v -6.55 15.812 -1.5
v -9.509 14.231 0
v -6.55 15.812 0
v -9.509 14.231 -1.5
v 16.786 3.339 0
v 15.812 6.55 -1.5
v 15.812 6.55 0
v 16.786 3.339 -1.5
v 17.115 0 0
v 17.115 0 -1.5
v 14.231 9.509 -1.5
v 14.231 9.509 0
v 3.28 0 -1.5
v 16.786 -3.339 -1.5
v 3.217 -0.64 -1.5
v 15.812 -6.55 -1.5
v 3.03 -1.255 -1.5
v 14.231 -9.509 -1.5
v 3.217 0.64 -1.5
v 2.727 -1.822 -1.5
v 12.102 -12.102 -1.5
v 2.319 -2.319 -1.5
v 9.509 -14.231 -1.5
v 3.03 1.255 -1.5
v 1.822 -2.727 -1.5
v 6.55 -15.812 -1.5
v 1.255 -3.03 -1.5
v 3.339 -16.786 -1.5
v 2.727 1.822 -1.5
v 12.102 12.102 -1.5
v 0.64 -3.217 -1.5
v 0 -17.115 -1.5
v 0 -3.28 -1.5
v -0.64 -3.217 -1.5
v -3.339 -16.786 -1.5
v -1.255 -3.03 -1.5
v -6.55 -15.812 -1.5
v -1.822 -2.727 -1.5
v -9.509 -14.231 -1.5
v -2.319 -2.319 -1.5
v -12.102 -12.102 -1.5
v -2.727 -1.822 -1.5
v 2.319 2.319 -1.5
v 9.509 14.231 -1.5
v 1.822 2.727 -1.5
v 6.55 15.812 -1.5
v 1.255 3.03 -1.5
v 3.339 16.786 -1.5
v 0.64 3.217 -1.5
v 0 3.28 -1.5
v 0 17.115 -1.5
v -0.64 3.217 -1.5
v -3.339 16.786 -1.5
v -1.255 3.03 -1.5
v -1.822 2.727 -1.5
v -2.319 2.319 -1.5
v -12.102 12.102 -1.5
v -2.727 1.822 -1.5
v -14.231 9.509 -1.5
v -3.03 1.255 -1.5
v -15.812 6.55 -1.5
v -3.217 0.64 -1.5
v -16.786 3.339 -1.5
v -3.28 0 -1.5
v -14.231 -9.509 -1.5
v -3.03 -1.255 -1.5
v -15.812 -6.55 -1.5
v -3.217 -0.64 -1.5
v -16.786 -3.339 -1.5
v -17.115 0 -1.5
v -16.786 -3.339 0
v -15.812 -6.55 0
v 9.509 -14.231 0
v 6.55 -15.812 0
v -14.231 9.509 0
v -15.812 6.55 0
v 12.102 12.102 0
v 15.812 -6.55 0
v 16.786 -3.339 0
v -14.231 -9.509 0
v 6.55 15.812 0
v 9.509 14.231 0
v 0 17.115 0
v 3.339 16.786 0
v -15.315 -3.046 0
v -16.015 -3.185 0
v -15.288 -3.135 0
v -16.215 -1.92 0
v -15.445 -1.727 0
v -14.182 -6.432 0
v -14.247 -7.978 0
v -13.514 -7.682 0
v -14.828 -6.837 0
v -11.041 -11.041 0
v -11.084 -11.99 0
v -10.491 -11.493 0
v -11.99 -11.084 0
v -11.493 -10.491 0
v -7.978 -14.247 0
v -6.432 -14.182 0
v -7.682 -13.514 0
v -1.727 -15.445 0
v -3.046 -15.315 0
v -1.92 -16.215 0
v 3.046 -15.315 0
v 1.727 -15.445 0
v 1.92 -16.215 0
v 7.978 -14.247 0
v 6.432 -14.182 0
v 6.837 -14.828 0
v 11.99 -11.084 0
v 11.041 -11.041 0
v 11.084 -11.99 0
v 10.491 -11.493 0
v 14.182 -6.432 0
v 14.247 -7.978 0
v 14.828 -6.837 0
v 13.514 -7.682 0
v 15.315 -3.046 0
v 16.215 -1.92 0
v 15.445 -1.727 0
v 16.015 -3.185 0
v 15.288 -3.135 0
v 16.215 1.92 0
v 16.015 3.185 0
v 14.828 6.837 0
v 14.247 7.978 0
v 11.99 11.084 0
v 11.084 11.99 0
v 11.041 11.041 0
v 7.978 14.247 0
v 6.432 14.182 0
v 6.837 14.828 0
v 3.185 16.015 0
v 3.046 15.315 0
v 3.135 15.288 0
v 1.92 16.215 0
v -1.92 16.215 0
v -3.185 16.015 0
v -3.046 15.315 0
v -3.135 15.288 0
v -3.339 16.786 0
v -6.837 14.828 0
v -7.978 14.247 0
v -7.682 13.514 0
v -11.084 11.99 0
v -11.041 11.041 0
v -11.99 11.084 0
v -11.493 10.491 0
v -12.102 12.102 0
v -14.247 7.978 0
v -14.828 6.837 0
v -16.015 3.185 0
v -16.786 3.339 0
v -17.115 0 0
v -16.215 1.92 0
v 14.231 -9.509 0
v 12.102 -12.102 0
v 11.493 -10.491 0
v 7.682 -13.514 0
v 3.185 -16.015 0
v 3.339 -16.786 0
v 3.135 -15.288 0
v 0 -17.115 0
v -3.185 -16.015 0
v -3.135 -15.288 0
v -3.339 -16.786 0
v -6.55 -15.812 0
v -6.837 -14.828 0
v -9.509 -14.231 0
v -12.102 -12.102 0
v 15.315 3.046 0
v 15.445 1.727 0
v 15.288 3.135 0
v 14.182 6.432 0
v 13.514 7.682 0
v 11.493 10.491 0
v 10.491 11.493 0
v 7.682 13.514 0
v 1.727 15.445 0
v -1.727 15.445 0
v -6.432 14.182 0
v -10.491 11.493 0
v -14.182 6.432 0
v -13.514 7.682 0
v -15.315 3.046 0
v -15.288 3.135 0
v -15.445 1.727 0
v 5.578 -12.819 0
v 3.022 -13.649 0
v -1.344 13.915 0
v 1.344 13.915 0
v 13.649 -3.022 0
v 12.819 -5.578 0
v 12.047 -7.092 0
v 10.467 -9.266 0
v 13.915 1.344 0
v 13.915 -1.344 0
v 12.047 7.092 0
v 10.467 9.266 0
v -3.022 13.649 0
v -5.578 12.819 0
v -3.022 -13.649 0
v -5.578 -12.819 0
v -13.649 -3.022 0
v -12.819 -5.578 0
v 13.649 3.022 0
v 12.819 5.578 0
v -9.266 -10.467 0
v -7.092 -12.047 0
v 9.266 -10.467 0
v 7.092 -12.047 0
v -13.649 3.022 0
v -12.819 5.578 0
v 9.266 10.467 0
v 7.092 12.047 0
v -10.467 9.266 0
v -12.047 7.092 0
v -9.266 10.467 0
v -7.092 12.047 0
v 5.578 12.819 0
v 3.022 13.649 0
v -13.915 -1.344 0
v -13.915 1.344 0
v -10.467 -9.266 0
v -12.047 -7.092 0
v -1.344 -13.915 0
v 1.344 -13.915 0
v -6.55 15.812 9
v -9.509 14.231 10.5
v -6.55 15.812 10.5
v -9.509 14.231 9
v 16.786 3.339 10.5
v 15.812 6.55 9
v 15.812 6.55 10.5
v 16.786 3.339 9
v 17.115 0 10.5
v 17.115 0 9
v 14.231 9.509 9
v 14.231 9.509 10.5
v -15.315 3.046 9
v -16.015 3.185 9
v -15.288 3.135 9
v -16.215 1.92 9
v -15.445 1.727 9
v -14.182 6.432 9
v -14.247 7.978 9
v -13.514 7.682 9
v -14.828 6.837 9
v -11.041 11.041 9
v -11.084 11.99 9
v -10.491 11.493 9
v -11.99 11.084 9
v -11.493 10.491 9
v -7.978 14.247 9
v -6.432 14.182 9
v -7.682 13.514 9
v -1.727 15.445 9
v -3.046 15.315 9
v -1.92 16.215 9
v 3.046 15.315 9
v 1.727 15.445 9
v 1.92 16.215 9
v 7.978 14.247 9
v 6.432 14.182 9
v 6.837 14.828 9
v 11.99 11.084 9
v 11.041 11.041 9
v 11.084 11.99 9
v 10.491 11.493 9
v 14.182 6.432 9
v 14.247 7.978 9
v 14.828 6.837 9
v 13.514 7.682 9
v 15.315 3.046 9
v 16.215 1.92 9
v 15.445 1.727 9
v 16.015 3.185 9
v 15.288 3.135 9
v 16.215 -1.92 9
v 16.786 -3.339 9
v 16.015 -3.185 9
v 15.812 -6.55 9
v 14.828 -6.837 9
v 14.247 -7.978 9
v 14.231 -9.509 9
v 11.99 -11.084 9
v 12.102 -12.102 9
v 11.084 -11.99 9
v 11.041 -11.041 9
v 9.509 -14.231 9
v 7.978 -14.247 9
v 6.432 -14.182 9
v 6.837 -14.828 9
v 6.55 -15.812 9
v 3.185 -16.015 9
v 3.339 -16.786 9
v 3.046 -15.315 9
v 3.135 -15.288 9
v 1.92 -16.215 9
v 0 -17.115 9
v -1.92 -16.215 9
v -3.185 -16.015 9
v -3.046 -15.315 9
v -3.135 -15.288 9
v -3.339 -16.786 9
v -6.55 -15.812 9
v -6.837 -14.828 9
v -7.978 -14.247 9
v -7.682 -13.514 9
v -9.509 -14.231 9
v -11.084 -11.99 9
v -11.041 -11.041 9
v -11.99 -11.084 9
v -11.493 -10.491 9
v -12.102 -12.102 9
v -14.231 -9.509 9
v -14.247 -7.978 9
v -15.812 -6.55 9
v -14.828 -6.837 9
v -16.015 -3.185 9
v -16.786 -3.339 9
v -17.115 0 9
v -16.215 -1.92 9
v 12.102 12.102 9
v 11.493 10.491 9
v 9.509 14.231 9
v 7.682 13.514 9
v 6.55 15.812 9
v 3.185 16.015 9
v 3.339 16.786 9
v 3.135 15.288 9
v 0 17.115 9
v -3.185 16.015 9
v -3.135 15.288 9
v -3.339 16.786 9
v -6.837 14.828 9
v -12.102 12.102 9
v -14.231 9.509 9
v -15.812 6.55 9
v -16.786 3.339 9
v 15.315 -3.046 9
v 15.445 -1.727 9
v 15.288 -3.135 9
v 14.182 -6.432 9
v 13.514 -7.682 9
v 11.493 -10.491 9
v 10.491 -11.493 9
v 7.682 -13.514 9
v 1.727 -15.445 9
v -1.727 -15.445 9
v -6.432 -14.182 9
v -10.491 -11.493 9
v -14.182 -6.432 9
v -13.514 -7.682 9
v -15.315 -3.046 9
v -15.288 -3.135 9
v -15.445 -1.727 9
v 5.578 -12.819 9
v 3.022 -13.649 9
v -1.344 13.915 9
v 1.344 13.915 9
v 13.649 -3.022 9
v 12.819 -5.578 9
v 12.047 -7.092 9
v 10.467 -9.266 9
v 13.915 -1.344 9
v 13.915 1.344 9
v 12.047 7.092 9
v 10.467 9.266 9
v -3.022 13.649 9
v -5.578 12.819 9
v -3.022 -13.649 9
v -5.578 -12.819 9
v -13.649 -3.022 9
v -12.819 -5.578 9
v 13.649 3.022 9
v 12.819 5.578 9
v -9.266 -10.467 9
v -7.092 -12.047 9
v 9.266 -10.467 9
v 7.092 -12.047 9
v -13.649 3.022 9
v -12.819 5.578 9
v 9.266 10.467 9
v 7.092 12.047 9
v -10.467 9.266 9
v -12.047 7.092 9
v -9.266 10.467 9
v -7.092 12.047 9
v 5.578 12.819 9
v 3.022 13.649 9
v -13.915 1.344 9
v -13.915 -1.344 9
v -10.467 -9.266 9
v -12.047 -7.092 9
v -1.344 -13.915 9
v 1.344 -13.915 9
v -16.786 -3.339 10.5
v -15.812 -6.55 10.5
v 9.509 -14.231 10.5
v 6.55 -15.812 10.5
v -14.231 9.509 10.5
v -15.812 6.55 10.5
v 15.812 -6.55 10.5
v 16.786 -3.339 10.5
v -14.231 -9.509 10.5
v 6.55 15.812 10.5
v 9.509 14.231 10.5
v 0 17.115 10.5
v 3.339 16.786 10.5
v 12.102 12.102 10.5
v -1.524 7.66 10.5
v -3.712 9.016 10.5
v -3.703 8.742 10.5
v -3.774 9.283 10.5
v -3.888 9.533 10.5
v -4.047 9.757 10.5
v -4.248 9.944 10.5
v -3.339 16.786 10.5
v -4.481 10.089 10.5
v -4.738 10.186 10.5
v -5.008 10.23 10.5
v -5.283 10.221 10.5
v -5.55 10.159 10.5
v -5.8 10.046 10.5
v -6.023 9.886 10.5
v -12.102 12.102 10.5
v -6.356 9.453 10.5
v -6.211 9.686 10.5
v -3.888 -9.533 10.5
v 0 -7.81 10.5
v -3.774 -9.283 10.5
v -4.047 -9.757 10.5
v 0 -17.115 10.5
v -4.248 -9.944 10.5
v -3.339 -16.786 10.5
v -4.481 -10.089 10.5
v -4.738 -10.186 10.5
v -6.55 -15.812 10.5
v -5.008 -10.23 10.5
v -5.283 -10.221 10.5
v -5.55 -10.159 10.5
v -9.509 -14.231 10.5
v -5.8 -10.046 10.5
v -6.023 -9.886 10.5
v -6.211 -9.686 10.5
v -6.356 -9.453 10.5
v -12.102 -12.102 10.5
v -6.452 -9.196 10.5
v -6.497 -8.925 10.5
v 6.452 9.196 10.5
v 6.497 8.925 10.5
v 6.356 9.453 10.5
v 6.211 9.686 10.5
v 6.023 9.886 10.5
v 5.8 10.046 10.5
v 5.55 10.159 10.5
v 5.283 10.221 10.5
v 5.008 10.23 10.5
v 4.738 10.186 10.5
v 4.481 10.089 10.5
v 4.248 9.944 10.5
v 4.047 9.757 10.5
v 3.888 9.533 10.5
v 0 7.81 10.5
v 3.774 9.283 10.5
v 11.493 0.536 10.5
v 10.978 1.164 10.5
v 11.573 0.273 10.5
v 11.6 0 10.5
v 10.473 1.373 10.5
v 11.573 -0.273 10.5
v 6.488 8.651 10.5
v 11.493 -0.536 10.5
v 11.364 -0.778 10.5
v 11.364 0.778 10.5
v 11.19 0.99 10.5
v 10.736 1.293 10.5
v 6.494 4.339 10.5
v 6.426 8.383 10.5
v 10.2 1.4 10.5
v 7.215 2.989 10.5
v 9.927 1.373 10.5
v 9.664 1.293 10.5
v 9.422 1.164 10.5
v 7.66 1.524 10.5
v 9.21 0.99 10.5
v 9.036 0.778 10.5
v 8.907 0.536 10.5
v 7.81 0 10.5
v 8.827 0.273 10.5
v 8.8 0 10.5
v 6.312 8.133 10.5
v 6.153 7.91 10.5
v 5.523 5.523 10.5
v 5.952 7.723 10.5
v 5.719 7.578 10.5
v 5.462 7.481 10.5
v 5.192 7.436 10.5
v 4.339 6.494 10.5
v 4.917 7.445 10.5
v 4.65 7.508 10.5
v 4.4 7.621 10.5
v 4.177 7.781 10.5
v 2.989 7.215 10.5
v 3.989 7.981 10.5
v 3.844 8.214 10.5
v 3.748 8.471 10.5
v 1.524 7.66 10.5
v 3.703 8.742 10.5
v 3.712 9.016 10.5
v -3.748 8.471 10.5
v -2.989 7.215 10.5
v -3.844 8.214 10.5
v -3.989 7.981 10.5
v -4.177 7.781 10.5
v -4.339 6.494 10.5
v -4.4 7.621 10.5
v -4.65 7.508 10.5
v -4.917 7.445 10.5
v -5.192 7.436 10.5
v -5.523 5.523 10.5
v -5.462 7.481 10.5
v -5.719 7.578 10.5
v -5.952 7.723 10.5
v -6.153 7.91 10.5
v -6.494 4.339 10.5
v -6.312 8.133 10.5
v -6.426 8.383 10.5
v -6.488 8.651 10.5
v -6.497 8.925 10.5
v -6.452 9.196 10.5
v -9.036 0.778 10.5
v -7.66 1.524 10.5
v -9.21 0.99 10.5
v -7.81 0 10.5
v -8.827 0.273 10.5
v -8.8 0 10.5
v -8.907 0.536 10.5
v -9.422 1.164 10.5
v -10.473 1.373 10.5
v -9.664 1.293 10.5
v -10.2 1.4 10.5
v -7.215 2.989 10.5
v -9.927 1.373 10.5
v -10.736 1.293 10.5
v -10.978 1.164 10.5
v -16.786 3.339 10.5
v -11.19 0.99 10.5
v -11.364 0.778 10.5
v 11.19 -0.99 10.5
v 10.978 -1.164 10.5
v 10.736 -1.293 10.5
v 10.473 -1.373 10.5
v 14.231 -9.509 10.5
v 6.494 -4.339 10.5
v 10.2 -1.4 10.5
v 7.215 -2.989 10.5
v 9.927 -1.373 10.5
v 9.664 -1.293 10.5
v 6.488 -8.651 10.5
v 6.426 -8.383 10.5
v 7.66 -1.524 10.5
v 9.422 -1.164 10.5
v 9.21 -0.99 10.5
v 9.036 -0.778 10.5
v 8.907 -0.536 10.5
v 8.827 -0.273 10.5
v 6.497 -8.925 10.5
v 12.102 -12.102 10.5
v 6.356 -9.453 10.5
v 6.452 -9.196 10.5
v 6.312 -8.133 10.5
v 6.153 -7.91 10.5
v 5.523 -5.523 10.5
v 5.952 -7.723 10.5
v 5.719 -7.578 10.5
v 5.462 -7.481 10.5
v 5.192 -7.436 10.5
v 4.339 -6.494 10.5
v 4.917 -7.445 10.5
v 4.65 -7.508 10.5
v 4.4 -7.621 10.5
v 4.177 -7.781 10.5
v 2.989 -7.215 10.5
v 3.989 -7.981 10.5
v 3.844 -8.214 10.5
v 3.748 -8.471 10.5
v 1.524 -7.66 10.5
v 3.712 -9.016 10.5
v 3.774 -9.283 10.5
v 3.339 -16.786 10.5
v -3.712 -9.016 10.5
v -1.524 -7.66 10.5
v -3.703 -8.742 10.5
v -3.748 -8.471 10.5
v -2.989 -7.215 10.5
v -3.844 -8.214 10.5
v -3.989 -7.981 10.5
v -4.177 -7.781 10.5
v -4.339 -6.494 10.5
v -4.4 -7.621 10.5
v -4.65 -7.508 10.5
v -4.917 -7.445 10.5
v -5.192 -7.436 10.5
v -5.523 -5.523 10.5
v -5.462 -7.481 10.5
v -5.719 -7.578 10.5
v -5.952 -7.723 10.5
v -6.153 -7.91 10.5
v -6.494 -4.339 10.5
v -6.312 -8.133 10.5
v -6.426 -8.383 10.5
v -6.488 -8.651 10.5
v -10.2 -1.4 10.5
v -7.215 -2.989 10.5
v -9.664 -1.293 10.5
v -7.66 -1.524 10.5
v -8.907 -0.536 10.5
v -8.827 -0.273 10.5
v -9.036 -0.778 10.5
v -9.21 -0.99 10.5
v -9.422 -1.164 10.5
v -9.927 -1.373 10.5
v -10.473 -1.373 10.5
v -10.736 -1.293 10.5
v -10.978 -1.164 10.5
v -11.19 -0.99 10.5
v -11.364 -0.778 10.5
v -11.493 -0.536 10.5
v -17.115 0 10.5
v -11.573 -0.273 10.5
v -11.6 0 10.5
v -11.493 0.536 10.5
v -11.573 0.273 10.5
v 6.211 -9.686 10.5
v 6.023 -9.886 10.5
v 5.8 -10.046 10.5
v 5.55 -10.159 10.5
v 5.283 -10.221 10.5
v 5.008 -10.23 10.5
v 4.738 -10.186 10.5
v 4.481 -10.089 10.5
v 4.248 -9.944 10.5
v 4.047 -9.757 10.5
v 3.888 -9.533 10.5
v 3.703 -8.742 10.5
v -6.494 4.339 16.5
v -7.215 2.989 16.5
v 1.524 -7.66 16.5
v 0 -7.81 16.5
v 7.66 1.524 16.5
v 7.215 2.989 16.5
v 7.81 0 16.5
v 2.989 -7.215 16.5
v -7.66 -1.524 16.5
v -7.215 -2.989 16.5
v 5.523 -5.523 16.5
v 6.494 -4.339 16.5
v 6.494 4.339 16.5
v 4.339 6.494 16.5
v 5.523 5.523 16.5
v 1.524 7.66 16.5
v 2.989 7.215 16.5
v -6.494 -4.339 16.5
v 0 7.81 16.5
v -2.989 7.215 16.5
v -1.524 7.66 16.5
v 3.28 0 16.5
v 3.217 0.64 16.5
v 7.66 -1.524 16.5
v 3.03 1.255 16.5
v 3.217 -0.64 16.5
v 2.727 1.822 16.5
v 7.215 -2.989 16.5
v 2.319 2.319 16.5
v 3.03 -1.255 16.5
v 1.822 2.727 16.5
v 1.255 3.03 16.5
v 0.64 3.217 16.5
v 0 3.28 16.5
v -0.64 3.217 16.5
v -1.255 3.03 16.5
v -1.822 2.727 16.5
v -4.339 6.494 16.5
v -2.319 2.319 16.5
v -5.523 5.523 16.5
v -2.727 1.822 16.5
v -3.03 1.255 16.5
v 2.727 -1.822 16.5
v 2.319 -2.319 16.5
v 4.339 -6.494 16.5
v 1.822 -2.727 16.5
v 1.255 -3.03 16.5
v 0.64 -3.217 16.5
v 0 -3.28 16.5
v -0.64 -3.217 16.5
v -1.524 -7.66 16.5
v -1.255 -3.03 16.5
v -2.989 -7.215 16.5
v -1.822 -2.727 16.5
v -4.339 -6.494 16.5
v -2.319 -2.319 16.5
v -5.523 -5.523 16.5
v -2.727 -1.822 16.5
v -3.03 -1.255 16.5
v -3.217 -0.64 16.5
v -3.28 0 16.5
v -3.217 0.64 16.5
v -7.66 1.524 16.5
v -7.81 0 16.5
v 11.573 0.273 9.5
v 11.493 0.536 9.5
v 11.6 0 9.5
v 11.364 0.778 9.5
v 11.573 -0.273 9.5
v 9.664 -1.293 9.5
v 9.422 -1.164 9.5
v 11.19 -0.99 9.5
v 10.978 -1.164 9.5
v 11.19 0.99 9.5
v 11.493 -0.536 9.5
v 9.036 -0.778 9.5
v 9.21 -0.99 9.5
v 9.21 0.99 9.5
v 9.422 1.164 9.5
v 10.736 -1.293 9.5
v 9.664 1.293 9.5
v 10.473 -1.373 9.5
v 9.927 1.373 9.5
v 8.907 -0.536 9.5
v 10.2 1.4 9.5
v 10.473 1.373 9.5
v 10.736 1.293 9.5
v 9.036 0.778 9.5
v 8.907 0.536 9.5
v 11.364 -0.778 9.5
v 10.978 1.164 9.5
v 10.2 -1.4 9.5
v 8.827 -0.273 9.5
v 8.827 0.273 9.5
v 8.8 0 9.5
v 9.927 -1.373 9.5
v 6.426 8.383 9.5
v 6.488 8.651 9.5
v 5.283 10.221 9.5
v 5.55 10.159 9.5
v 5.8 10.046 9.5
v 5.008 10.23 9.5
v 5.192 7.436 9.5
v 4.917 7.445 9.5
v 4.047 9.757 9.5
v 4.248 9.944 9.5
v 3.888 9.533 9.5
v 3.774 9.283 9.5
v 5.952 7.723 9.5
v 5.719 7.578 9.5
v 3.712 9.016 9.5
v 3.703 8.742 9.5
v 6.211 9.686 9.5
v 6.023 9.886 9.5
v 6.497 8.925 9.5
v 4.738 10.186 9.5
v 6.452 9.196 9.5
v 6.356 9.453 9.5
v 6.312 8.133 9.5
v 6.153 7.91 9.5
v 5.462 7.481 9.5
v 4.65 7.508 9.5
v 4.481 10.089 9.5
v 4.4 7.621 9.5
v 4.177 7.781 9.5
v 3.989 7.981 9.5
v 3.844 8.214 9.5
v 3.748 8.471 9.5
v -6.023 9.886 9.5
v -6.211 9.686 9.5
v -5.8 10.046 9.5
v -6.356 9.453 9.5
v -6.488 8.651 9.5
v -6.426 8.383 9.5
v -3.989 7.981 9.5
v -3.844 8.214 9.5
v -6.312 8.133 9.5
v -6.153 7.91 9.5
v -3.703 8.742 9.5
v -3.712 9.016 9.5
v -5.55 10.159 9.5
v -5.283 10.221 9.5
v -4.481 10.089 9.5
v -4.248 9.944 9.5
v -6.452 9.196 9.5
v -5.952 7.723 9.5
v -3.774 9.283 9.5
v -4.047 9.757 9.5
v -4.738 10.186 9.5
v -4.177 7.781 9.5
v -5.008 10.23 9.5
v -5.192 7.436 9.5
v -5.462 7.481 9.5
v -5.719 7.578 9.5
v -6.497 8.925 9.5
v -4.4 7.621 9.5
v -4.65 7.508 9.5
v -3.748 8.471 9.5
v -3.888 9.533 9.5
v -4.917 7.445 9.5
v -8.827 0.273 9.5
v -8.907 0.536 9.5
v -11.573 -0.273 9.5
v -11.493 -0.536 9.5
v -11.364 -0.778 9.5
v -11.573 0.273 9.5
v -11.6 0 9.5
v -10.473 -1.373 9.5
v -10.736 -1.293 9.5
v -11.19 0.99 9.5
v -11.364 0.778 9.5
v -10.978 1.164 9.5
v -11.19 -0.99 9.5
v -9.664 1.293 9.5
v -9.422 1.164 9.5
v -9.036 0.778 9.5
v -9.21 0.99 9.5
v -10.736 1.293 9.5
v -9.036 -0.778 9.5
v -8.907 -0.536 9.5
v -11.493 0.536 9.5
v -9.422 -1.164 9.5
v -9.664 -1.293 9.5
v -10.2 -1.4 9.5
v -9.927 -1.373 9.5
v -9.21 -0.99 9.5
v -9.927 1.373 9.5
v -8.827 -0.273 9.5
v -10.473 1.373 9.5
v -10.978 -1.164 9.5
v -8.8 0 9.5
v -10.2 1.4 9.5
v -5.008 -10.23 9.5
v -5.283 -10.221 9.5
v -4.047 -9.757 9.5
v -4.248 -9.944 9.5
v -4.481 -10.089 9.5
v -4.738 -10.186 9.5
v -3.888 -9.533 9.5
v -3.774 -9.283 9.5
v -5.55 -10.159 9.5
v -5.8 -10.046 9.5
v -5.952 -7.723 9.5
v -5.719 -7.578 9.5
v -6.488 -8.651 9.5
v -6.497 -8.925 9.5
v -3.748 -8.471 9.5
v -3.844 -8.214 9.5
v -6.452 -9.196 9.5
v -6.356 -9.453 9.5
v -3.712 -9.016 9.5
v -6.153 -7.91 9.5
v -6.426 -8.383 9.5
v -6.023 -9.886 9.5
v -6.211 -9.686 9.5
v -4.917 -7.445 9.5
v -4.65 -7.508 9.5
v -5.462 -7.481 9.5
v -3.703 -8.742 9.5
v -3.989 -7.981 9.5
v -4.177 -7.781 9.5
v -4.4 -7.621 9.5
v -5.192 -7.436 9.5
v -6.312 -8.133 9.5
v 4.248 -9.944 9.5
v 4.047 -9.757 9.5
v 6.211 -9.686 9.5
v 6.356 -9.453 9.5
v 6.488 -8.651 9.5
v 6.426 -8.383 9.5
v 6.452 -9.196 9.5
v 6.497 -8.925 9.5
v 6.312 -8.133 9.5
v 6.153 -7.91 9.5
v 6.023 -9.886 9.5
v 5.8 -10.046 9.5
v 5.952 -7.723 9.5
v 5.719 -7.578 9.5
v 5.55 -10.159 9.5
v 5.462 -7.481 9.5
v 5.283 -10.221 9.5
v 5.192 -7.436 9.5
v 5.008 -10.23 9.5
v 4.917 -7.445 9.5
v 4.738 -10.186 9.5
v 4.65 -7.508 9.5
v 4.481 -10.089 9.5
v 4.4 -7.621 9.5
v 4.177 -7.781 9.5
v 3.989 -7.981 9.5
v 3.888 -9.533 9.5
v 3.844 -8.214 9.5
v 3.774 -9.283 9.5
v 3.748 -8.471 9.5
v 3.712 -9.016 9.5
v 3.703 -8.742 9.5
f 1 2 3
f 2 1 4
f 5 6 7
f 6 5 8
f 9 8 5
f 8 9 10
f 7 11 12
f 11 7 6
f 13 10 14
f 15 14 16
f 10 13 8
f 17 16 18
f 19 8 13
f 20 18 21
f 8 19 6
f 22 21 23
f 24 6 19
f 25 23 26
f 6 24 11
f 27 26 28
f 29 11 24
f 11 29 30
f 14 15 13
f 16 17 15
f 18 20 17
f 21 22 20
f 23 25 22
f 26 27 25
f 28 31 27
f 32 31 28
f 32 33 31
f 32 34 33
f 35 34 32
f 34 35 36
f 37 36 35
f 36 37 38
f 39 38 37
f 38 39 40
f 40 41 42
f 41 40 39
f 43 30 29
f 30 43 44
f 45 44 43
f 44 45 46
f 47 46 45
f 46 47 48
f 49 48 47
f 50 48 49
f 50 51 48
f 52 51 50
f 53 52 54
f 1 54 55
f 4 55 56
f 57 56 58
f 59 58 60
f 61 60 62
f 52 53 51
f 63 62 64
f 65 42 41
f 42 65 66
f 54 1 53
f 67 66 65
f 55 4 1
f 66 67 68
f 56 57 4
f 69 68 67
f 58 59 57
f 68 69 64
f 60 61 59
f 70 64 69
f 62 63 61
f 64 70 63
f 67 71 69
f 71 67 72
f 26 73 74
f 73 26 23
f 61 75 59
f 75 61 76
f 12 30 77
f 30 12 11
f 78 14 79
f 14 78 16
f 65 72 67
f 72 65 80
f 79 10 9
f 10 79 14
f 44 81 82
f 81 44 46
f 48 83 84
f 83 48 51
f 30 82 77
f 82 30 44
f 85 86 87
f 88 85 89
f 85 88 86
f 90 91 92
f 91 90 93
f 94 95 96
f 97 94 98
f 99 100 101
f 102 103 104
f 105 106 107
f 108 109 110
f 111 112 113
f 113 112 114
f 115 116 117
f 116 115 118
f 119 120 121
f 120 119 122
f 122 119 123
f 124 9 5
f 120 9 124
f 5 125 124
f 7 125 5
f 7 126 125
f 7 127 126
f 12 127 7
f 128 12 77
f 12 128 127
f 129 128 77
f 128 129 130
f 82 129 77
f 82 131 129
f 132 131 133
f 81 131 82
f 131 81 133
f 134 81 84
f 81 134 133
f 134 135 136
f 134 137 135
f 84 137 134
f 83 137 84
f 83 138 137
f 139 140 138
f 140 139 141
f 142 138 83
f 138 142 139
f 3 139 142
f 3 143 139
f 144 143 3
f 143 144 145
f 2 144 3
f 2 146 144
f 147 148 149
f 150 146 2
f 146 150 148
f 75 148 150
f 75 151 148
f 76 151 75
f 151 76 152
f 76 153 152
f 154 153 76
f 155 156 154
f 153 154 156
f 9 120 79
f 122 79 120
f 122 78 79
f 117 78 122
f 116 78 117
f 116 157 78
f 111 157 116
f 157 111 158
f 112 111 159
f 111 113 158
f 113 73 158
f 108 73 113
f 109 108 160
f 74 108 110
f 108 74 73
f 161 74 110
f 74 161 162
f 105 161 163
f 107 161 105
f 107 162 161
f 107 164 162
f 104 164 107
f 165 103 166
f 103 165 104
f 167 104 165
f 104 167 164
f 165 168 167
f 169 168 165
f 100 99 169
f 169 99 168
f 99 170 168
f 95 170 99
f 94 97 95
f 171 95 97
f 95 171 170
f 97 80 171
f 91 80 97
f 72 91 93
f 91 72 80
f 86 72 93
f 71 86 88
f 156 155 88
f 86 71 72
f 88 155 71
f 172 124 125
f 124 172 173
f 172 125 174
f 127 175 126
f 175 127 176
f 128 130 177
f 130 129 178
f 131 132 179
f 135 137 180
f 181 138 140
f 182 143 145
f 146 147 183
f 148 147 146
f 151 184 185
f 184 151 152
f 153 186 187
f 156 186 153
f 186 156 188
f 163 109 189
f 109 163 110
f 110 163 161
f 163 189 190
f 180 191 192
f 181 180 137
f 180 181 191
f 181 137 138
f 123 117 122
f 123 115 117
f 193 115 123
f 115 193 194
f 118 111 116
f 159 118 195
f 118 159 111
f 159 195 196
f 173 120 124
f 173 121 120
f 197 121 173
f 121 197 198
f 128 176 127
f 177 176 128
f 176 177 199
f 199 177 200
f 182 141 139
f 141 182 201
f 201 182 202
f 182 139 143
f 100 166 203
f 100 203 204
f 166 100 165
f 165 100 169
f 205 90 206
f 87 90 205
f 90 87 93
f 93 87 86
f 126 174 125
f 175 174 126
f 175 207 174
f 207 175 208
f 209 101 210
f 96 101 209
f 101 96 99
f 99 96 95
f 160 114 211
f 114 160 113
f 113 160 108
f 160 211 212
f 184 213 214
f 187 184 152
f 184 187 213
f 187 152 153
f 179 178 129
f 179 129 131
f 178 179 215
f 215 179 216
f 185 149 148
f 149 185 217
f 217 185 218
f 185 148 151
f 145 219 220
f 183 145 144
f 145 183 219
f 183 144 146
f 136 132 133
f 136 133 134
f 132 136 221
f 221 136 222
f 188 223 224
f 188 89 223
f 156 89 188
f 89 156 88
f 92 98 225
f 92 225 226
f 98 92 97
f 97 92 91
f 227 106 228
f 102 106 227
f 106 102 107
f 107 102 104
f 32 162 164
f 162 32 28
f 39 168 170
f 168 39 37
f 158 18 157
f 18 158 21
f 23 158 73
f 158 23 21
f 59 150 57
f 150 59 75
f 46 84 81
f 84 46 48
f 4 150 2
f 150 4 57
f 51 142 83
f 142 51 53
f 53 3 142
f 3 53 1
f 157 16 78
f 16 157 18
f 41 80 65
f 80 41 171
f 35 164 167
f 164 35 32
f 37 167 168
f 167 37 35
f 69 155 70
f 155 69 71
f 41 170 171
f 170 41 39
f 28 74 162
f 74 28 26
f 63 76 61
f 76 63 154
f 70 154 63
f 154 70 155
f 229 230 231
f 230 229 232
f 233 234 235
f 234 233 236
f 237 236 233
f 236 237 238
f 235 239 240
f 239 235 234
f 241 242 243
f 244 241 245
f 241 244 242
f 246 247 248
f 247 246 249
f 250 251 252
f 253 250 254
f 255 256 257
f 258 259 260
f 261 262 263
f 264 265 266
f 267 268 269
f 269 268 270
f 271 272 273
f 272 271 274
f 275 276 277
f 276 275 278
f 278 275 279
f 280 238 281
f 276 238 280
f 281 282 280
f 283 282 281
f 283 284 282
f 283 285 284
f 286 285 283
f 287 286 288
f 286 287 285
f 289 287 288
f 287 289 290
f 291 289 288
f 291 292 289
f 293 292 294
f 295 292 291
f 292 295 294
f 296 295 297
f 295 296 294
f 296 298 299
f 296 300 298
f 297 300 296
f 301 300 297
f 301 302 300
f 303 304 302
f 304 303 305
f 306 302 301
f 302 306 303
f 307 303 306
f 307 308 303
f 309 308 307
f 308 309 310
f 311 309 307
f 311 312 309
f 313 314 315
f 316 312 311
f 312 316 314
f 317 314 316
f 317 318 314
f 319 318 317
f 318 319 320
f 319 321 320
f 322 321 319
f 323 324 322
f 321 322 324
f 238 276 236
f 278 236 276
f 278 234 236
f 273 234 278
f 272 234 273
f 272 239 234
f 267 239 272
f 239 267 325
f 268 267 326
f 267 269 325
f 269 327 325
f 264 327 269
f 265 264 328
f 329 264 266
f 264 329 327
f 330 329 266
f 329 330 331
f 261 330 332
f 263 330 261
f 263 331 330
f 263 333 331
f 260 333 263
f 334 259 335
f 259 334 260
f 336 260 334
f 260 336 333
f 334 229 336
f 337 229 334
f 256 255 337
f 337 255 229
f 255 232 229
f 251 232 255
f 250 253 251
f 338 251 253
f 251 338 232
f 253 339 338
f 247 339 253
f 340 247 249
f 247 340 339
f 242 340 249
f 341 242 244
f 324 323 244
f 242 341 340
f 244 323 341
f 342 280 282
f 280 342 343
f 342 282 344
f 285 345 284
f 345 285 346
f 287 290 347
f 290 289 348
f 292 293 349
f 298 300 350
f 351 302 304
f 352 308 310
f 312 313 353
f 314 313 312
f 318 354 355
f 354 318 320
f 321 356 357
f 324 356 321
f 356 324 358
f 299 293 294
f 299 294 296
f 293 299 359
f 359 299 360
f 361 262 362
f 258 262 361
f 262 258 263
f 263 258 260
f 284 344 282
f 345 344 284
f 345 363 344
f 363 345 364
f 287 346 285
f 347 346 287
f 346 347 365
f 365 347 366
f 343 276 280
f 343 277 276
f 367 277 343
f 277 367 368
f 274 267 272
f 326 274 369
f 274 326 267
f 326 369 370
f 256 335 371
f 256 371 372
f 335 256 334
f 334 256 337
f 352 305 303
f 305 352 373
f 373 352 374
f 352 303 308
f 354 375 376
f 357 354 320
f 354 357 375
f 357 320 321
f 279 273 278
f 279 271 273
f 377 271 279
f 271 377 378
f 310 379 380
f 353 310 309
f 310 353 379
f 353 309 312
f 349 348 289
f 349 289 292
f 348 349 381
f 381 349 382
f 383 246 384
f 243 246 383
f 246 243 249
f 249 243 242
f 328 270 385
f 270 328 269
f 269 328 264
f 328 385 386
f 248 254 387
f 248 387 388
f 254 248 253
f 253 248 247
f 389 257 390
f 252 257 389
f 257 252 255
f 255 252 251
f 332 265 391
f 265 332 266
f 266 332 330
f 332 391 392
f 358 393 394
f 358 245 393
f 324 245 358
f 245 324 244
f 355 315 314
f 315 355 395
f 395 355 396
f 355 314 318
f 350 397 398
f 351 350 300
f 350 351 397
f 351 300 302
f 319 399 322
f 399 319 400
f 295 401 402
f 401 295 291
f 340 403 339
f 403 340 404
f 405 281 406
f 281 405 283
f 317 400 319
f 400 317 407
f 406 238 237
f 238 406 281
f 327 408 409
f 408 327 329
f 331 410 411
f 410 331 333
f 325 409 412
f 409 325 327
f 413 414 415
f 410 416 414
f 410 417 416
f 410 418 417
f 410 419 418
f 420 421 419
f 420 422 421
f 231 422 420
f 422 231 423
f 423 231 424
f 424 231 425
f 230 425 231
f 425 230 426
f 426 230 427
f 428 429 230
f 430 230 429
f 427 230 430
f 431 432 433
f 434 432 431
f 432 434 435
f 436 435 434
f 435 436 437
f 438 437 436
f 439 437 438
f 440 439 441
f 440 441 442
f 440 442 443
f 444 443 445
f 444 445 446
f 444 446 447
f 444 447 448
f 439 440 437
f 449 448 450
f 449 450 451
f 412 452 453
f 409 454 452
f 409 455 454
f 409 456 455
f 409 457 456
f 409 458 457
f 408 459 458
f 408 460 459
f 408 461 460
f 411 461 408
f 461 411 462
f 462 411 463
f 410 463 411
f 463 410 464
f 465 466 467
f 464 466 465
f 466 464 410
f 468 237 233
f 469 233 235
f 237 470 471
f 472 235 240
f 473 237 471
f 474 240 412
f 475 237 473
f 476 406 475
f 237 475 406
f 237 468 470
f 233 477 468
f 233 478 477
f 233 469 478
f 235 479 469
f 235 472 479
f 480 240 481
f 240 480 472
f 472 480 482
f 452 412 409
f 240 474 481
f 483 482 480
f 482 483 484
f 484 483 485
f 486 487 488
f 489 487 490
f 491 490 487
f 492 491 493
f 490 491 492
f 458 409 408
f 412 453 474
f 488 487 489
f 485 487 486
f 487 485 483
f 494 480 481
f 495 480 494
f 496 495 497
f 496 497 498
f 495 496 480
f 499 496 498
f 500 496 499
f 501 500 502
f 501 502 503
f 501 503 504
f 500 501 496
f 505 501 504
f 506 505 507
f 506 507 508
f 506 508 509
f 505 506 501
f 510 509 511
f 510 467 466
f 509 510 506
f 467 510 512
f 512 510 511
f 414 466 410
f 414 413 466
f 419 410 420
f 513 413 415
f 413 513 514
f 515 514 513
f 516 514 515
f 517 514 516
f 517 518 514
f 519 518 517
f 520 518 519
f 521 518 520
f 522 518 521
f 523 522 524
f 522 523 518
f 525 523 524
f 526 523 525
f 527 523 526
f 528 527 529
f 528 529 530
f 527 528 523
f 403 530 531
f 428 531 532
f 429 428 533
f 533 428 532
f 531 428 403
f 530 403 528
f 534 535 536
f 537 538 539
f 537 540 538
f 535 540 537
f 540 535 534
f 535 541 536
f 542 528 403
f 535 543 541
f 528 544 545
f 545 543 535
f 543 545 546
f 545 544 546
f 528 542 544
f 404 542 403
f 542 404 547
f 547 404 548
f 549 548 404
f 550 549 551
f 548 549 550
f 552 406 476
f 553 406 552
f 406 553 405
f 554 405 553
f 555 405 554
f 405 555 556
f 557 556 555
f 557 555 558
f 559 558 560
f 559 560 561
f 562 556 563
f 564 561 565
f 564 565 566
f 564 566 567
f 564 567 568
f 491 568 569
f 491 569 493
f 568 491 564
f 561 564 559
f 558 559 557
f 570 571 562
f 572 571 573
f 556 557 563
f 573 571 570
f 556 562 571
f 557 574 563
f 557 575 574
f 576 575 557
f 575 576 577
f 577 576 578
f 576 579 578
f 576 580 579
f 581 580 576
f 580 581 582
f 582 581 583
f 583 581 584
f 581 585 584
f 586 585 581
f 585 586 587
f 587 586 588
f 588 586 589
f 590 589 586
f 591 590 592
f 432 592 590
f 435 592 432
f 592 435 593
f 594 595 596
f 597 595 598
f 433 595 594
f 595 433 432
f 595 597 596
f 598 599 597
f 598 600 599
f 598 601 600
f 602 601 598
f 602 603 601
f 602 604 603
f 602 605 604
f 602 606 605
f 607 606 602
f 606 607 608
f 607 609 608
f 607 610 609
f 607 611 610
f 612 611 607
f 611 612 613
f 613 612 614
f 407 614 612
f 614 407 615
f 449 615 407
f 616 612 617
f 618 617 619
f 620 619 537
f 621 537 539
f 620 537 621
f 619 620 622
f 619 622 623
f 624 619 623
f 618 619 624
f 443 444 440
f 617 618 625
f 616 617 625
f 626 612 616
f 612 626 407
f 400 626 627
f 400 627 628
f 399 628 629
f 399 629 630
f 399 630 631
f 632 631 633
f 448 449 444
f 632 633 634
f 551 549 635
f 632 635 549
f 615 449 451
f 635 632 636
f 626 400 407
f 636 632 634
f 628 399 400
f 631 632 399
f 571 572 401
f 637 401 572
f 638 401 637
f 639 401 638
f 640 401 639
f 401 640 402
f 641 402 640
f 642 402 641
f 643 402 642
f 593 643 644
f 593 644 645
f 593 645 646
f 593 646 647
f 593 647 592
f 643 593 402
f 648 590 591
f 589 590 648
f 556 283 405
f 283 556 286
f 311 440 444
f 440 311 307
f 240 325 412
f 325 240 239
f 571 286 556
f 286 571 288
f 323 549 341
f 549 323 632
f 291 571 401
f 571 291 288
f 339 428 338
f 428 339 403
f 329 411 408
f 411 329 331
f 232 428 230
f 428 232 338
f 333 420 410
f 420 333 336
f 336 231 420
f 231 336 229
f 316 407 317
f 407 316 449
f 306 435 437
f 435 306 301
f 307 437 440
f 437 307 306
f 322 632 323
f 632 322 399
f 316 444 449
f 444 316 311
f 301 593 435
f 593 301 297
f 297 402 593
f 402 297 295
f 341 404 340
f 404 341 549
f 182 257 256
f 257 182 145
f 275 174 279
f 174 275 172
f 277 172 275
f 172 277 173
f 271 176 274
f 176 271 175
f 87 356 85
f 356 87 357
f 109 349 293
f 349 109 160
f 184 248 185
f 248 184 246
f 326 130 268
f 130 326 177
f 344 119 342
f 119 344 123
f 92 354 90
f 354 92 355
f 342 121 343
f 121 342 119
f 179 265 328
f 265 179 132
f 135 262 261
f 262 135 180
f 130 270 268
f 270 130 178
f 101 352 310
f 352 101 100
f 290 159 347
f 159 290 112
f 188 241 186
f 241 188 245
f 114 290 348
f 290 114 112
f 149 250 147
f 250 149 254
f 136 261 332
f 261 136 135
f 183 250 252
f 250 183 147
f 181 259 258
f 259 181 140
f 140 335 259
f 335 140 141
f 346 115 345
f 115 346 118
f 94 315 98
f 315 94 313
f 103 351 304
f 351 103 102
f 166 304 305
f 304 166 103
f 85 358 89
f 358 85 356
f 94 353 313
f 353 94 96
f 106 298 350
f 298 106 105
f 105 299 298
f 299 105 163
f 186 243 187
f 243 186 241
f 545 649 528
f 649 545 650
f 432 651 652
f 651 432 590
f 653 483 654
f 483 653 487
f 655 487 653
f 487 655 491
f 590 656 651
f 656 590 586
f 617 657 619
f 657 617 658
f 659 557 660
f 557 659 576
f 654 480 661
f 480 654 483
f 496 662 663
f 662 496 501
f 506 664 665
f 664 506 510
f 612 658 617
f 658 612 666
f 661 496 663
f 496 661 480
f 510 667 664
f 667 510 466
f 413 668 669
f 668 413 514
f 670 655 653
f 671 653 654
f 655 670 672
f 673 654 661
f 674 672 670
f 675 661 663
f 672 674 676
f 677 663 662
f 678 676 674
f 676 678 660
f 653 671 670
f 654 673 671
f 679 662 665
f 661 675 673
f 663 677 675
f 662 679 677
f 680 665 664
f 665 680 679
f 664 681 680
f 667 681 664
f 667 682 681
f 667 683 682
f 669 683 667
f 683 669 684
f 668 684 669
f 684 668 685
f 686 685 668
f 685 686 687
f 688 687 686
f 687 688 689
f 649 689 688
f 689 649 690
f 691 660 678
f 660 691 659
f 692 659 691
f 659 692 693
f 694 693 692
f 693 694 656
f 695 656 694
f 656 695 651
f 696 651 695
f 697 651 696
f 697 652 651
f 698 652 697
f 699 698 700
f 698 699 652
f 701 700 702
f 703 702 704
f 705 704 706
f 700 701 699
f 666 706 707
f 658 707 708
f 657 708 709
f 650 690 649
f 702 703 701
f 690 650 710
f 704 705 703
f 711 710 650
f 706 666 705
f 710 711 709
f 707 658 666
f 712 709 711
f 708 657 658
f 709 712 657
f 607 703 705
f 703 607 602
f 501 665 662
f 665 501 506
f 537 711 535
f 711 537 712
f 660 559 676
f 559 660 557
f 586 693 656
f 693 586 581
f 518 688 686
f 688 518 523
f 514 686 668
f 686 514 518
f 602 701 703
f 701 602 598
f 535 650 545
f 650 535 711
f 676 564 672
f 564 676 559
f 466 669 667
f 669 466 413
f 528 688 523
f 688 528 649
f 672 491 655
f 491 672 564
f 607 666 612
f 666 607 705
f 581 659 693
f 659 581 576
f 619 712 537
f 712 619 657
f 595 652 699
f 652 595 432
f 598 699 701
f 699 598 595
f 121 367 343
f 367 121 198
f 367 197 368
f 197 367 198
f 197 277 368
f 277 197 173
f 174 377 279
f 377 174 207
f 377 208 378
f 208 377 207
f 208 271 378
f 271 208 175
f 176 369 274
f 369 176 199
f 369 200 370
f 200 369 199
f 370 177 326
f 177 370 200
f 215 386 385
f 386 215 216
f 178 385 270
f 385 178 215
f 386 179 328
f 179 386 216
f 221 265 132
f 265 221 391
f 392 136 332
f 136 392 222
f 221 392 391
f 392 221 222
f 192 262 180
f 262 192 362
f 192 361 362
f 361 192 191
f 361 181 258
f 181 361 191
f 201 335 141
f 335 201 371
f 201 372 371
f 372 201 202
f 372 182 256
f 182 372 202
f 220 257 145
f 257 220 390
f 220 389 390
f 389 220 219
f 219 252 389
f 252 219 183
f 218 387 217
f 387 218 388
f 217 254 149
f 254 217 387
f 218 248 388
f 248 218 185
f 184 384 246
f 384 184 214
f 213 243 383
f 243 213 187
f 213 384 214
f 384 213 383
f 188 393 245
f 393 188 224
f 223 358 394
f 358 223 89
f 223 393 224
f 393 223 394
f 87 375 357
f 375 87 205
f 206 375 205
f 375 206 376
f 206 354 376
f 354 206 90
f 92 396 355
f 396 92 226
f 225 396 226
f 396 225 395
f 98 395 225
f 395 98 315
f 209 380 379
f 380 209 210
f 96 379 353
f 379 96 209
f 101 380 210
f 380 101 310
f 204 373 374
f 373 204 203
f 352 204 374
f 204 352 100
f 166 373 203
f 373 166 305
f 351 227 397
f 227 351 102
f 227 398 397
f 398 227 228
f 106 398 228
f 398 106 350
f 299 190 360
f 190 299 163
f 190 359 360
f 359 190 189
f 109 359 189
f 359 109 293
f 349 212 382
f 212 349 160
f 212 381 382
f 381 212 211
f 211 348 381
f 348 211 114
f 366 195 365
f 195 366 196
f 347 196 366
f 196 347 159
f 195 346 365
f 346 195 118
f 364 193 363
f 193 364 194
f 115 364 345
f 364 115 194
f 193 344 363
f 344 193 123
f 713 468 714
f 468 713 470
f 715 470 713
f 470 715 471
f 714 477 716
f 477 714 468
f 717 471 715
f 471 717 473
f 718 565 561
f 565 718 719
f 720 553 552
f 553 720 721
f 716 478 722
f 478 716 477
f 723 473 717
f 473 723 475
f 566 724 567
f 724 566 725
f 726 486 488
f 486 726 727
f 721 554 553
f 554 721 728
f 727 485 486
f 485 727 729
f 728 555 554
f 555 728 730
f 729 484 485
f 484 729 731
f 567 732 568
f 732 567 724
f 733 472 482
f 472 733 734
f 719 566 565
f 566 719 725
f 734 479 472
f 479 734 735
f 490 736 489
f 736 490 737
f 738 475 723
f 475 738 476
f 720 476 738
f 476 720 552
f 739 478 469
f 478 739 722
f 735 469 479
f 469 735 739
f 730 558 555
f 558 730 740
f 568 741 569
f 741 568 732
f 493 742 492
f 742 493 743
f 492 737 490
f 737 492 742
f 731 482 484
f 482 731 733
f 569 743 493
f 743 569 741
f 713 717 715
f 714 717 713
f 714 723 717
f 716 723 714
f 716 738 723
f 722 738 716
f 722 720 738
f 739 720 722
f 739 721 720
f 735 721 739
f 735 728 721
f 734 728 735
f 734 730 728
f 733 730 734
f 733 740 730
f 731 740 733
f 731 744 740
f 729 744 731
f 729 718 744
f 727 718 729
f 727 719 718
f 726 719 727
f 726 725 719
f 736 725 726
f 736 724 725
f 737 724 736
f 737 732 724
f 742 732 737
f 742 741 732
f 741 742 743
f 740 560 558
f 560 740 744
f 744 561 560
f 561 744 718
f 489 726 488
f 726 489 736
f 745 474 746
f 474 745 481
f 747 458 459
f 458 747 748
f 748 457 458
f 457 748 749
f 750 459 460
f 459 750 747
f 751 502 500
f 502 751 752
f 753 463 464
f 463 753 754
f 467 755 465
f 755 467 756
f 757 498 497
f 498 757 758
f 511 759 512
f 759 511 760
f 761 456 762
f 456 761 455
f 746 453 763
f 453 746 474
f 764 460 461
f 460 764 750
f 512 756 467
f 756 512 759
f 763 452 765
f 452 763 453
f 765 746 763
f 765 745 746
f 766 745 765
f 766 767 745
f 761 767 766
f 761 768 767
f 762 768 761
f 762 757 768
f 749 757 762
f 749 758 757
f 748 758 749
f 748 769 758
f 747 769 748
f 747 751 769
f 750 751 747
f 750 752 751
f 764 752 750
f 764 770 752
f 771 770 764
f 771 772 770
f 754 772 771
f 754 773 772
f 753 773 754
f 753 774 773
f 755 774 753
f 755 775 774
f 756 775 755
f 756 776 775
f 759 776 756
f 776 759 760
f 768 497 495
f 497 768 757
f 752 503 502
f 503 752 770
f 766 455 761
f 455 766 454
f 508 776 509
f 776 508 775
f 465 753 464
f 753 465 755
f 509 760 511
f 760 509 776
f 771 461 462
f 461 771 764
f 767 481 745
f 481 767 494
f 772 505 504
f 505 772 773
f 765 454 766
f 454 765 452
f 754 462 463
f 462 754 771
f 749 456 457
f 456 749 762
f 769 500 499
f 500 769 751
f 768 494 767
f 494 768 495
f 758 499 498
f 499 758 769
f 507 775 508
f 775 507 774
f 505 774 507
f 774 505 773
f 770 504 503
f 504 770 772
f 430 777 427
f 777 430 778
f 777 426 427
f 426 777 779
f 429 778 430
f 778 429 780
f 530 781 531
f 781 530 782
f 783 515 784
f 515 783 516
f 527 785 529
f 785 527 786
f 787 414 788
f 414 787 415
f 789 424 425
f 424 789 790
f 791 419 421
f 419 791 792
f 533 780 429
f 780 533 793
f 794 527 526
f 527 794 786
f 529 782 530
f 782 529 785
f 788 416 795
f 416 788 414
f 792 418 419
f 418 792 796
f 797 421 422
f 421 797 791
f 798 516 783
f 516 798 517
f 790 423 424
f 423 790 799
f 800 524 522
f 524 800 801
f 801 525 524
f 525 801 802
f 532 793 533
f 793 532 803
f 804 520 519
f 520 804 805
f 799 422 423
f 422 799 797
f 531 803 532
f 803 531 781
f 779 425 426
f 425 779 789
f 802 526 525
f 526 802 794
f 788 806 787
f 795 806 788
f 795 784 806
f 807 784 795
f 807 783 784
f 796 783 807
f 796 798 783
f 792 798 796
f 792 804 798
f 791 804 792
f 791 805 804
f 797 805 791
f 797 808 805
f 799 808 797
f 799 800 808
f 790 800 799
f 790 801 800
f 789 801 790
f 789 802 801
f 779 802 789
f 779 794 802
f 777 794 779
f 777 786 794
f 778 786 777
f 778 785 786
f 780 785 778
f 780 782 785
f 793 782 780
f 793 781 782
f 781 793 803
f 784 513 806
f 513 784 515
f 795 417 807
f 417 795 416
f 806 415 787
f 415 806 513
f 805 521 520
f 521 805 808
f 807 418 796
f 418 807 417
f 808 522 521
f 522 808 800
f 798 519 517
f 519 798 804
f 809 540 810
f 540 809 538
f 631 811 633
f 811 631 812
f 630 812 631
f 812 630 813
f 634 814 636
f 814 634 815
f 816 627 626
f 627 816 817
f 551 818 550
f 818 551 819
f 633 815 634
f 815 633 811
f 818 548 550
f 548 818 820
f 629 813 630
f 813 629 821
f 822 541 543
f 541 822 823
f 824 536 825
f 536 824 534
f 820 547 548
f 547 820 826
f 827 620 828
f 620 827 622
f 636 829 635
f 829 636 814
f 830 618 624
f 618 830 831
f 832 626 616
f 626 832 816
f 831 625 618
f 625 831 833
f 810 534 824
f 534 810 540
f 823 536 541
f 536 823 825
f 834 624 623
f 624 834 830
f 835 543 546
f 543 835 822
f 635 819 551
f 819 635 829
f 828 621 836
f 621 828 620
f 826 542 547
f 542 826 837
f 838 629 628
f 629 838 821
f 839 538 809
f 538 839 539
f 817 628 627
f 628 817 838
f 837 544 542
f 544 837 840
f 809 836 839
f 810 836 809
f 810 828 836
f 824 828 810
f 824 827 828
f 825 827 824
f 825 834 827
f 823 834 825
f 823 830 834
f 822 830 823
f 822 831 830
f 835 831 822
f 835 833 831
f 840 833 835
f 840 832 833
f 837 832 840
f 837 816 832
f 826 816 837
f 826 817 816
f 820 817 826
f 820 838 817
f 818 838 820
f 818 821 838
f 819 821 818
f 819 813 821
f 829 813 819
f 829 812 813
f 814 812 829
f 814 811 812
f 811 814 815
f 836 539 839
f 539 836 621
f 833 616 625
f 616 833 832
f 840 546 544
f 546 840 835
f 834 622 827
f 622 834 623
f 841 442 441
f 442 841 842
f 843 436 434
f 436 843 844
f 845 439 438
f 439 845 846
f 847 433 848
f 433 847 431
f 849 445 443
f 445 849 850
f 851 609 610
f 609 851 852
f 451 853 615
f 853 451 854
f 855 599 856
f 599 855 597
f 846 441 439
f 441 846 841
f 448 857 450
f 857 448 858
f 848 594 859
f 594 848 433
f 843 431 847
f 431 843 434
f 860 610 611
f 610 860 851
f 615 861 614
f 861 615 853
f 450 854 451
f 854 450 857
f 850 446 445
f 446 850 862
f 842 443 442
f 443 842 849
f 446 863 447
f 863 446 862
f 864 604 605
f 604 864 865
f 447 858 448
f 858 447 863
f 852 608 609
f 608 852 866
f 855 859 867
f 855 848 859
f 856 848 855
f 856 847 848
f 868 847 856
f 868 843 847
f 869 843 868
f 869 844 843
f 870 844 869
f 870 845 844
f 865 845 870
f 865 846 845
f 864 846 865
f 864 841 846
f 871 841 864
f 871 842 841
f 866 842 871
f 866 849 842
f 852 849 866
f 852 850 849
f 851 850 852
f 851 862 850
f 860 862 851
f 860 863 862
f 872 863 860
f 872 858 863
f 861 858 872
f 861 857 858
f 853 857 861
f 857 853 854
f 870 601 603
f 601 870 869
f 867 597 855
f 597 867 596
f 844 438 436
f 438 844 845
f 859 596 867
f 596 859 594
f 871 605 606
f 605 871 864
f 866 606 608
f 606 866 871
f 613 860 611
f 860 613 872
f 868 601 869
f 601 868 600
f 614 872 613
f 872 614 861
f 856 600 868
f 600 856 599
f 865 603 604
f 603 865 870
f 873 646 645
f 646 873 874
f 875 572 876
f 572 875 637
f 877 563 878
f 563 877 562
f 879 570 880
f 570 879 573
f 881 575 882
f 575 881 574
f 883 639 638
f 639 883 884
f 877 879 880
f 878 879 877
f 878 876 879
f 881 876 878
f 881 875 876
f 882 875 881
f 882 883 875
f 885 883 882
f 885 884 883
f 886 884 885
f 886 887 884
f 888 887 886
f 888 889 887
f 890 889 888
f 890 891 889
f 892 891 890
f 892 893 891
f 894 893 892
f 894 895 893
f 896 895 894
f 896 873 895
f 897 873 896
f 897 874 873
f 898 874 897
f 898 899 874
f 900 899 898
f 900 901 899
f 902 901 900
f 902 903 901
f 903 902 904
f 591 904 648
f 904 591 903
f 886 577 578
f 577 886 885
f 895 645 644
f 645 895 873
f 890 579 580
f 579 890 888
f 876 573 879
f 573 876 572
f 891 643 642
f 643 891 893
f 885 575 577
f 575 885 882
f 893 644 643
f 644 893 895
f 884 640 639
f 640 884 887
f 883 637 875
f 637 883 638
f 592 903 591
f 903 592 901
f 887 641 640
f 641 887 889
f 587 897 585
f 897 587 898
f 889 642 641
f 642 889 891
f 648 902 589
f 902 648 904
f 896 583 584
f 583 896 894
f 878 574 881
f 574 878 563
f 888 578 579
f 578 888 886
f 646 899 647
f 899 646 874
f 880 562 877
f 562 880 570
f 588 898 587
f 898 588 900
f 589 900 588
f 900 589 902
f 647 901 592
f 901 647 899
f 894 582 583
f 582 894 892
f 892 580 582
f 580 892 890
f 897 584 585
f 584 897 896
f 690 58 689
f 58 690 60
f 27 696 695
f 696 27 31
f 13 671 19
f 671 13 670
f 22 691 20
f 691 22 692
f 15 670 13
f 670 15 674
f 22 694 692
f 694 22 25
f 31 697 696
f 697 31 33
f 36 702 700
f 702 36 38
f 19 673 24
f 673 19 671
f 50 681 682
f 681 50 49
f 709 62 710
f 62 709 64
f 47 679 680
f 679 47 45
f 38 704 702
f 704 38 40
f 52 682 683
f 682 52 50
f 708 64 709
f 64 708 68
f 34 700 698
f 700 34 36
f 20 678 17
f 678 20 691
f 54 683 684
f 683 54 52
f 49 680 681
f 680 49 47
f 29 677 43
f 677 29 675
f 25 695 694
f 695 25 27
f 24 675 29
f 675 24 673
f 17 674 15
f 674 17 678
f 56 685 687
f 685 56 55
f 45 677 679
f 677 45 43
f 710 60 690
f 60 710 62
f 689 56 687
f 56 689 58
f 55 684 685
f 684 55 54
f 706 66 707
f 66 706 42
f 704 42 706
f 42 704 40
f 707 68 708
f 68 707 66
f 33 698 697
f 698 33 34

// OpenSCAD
$fn = 32;

// ----------------------------------------------------------------------
// Timing pulley: HTD5 20T, pitch 5 mm, 34.23 mm x 18 mm
// ----------------------------------------------------------------------

// --- parameters (mm) ---
pitch_mm = 5;             // belt pitch
tooth_count = 20;         // number of grooves
width = 9;                // belt width between the flanges
tip_d = 31.23;            // tip circle diameter
root_d = 29.03;           // groove bottom diameter
groove_h = 1.1;           // groove depth
tooth_w = 3.2;            // groove width at the tip circle
side_d = 34.23;           // flange diameter
side_t = 1.5;             // flange thickness
spigot_d = 27.43;         // flange spigot, sunk into the rim
spigot_h = 1.2;           // spigot depth into the rim
hub_bore = 6.56;          // shaft bore
hub_d = 15.62;            // hub diameter
hub_h = 6;                // hub above the flange
bottom_z = -1.5;          // lowest point of the pulley
top_z = 16.5;             // highest point of the pulley
ring_d = 2.8;             // clamp screw hole
ring_r = 10.2;            // clamp screw radius

module rim() {
  cylinder(h = width, d = tip_d);
}

module groove_cutter() {
  /* belt tooth groove: deeper than wide, cut through the belt width */
  translate([root_d / 2, 0, 0])
    linear_extrude(height = width)
      polygon(points = [[-0.6, -tooth_w * 0.42], [groove_h + 0.6, -tooth_w * 0.6],
                        [groove_h + 0.6, tooth_w * 0.6], [-0.6, tooth_w * 0.42]]);
}

module flanges() {
  translate([0, 0, -side_t]) cylinder(h = side_t, d = side_d);
  translate([0, 0, width]) cylinder(h = side_t, d = side_d);
  translate([0, 0, -spigot_h]) cylinder(h = spigot_h + 0.6, d = spigot_d);
  translate([0, 0, width - 0.6]) cylinder(h = spigot_h + 0.6, d = spigot_d);
}

module hub() {
  translate([0, 0, bottom_z]) cylinder(h = top_z - bottom_z, d = hub_d);
}

difference() {
  union() {
    rim();
    hub();
    flanges();
  }
  for (i = [0 : tooth_count - 1]) rotate([0, 0, i * 360 / tooth_count]) groove_cutter();
  translate([0, 0, bottom_z - 1]) cylinder(h = top_z - bottom_z + 2, d = hub_bore);
  for (i = [0 : 5]) rotate([0, 0, i * 60]) translate([ring_r, 0, top_z - hub_h - 1])
    cylinder(h = hub_h + 2, d = ring_d);
}
